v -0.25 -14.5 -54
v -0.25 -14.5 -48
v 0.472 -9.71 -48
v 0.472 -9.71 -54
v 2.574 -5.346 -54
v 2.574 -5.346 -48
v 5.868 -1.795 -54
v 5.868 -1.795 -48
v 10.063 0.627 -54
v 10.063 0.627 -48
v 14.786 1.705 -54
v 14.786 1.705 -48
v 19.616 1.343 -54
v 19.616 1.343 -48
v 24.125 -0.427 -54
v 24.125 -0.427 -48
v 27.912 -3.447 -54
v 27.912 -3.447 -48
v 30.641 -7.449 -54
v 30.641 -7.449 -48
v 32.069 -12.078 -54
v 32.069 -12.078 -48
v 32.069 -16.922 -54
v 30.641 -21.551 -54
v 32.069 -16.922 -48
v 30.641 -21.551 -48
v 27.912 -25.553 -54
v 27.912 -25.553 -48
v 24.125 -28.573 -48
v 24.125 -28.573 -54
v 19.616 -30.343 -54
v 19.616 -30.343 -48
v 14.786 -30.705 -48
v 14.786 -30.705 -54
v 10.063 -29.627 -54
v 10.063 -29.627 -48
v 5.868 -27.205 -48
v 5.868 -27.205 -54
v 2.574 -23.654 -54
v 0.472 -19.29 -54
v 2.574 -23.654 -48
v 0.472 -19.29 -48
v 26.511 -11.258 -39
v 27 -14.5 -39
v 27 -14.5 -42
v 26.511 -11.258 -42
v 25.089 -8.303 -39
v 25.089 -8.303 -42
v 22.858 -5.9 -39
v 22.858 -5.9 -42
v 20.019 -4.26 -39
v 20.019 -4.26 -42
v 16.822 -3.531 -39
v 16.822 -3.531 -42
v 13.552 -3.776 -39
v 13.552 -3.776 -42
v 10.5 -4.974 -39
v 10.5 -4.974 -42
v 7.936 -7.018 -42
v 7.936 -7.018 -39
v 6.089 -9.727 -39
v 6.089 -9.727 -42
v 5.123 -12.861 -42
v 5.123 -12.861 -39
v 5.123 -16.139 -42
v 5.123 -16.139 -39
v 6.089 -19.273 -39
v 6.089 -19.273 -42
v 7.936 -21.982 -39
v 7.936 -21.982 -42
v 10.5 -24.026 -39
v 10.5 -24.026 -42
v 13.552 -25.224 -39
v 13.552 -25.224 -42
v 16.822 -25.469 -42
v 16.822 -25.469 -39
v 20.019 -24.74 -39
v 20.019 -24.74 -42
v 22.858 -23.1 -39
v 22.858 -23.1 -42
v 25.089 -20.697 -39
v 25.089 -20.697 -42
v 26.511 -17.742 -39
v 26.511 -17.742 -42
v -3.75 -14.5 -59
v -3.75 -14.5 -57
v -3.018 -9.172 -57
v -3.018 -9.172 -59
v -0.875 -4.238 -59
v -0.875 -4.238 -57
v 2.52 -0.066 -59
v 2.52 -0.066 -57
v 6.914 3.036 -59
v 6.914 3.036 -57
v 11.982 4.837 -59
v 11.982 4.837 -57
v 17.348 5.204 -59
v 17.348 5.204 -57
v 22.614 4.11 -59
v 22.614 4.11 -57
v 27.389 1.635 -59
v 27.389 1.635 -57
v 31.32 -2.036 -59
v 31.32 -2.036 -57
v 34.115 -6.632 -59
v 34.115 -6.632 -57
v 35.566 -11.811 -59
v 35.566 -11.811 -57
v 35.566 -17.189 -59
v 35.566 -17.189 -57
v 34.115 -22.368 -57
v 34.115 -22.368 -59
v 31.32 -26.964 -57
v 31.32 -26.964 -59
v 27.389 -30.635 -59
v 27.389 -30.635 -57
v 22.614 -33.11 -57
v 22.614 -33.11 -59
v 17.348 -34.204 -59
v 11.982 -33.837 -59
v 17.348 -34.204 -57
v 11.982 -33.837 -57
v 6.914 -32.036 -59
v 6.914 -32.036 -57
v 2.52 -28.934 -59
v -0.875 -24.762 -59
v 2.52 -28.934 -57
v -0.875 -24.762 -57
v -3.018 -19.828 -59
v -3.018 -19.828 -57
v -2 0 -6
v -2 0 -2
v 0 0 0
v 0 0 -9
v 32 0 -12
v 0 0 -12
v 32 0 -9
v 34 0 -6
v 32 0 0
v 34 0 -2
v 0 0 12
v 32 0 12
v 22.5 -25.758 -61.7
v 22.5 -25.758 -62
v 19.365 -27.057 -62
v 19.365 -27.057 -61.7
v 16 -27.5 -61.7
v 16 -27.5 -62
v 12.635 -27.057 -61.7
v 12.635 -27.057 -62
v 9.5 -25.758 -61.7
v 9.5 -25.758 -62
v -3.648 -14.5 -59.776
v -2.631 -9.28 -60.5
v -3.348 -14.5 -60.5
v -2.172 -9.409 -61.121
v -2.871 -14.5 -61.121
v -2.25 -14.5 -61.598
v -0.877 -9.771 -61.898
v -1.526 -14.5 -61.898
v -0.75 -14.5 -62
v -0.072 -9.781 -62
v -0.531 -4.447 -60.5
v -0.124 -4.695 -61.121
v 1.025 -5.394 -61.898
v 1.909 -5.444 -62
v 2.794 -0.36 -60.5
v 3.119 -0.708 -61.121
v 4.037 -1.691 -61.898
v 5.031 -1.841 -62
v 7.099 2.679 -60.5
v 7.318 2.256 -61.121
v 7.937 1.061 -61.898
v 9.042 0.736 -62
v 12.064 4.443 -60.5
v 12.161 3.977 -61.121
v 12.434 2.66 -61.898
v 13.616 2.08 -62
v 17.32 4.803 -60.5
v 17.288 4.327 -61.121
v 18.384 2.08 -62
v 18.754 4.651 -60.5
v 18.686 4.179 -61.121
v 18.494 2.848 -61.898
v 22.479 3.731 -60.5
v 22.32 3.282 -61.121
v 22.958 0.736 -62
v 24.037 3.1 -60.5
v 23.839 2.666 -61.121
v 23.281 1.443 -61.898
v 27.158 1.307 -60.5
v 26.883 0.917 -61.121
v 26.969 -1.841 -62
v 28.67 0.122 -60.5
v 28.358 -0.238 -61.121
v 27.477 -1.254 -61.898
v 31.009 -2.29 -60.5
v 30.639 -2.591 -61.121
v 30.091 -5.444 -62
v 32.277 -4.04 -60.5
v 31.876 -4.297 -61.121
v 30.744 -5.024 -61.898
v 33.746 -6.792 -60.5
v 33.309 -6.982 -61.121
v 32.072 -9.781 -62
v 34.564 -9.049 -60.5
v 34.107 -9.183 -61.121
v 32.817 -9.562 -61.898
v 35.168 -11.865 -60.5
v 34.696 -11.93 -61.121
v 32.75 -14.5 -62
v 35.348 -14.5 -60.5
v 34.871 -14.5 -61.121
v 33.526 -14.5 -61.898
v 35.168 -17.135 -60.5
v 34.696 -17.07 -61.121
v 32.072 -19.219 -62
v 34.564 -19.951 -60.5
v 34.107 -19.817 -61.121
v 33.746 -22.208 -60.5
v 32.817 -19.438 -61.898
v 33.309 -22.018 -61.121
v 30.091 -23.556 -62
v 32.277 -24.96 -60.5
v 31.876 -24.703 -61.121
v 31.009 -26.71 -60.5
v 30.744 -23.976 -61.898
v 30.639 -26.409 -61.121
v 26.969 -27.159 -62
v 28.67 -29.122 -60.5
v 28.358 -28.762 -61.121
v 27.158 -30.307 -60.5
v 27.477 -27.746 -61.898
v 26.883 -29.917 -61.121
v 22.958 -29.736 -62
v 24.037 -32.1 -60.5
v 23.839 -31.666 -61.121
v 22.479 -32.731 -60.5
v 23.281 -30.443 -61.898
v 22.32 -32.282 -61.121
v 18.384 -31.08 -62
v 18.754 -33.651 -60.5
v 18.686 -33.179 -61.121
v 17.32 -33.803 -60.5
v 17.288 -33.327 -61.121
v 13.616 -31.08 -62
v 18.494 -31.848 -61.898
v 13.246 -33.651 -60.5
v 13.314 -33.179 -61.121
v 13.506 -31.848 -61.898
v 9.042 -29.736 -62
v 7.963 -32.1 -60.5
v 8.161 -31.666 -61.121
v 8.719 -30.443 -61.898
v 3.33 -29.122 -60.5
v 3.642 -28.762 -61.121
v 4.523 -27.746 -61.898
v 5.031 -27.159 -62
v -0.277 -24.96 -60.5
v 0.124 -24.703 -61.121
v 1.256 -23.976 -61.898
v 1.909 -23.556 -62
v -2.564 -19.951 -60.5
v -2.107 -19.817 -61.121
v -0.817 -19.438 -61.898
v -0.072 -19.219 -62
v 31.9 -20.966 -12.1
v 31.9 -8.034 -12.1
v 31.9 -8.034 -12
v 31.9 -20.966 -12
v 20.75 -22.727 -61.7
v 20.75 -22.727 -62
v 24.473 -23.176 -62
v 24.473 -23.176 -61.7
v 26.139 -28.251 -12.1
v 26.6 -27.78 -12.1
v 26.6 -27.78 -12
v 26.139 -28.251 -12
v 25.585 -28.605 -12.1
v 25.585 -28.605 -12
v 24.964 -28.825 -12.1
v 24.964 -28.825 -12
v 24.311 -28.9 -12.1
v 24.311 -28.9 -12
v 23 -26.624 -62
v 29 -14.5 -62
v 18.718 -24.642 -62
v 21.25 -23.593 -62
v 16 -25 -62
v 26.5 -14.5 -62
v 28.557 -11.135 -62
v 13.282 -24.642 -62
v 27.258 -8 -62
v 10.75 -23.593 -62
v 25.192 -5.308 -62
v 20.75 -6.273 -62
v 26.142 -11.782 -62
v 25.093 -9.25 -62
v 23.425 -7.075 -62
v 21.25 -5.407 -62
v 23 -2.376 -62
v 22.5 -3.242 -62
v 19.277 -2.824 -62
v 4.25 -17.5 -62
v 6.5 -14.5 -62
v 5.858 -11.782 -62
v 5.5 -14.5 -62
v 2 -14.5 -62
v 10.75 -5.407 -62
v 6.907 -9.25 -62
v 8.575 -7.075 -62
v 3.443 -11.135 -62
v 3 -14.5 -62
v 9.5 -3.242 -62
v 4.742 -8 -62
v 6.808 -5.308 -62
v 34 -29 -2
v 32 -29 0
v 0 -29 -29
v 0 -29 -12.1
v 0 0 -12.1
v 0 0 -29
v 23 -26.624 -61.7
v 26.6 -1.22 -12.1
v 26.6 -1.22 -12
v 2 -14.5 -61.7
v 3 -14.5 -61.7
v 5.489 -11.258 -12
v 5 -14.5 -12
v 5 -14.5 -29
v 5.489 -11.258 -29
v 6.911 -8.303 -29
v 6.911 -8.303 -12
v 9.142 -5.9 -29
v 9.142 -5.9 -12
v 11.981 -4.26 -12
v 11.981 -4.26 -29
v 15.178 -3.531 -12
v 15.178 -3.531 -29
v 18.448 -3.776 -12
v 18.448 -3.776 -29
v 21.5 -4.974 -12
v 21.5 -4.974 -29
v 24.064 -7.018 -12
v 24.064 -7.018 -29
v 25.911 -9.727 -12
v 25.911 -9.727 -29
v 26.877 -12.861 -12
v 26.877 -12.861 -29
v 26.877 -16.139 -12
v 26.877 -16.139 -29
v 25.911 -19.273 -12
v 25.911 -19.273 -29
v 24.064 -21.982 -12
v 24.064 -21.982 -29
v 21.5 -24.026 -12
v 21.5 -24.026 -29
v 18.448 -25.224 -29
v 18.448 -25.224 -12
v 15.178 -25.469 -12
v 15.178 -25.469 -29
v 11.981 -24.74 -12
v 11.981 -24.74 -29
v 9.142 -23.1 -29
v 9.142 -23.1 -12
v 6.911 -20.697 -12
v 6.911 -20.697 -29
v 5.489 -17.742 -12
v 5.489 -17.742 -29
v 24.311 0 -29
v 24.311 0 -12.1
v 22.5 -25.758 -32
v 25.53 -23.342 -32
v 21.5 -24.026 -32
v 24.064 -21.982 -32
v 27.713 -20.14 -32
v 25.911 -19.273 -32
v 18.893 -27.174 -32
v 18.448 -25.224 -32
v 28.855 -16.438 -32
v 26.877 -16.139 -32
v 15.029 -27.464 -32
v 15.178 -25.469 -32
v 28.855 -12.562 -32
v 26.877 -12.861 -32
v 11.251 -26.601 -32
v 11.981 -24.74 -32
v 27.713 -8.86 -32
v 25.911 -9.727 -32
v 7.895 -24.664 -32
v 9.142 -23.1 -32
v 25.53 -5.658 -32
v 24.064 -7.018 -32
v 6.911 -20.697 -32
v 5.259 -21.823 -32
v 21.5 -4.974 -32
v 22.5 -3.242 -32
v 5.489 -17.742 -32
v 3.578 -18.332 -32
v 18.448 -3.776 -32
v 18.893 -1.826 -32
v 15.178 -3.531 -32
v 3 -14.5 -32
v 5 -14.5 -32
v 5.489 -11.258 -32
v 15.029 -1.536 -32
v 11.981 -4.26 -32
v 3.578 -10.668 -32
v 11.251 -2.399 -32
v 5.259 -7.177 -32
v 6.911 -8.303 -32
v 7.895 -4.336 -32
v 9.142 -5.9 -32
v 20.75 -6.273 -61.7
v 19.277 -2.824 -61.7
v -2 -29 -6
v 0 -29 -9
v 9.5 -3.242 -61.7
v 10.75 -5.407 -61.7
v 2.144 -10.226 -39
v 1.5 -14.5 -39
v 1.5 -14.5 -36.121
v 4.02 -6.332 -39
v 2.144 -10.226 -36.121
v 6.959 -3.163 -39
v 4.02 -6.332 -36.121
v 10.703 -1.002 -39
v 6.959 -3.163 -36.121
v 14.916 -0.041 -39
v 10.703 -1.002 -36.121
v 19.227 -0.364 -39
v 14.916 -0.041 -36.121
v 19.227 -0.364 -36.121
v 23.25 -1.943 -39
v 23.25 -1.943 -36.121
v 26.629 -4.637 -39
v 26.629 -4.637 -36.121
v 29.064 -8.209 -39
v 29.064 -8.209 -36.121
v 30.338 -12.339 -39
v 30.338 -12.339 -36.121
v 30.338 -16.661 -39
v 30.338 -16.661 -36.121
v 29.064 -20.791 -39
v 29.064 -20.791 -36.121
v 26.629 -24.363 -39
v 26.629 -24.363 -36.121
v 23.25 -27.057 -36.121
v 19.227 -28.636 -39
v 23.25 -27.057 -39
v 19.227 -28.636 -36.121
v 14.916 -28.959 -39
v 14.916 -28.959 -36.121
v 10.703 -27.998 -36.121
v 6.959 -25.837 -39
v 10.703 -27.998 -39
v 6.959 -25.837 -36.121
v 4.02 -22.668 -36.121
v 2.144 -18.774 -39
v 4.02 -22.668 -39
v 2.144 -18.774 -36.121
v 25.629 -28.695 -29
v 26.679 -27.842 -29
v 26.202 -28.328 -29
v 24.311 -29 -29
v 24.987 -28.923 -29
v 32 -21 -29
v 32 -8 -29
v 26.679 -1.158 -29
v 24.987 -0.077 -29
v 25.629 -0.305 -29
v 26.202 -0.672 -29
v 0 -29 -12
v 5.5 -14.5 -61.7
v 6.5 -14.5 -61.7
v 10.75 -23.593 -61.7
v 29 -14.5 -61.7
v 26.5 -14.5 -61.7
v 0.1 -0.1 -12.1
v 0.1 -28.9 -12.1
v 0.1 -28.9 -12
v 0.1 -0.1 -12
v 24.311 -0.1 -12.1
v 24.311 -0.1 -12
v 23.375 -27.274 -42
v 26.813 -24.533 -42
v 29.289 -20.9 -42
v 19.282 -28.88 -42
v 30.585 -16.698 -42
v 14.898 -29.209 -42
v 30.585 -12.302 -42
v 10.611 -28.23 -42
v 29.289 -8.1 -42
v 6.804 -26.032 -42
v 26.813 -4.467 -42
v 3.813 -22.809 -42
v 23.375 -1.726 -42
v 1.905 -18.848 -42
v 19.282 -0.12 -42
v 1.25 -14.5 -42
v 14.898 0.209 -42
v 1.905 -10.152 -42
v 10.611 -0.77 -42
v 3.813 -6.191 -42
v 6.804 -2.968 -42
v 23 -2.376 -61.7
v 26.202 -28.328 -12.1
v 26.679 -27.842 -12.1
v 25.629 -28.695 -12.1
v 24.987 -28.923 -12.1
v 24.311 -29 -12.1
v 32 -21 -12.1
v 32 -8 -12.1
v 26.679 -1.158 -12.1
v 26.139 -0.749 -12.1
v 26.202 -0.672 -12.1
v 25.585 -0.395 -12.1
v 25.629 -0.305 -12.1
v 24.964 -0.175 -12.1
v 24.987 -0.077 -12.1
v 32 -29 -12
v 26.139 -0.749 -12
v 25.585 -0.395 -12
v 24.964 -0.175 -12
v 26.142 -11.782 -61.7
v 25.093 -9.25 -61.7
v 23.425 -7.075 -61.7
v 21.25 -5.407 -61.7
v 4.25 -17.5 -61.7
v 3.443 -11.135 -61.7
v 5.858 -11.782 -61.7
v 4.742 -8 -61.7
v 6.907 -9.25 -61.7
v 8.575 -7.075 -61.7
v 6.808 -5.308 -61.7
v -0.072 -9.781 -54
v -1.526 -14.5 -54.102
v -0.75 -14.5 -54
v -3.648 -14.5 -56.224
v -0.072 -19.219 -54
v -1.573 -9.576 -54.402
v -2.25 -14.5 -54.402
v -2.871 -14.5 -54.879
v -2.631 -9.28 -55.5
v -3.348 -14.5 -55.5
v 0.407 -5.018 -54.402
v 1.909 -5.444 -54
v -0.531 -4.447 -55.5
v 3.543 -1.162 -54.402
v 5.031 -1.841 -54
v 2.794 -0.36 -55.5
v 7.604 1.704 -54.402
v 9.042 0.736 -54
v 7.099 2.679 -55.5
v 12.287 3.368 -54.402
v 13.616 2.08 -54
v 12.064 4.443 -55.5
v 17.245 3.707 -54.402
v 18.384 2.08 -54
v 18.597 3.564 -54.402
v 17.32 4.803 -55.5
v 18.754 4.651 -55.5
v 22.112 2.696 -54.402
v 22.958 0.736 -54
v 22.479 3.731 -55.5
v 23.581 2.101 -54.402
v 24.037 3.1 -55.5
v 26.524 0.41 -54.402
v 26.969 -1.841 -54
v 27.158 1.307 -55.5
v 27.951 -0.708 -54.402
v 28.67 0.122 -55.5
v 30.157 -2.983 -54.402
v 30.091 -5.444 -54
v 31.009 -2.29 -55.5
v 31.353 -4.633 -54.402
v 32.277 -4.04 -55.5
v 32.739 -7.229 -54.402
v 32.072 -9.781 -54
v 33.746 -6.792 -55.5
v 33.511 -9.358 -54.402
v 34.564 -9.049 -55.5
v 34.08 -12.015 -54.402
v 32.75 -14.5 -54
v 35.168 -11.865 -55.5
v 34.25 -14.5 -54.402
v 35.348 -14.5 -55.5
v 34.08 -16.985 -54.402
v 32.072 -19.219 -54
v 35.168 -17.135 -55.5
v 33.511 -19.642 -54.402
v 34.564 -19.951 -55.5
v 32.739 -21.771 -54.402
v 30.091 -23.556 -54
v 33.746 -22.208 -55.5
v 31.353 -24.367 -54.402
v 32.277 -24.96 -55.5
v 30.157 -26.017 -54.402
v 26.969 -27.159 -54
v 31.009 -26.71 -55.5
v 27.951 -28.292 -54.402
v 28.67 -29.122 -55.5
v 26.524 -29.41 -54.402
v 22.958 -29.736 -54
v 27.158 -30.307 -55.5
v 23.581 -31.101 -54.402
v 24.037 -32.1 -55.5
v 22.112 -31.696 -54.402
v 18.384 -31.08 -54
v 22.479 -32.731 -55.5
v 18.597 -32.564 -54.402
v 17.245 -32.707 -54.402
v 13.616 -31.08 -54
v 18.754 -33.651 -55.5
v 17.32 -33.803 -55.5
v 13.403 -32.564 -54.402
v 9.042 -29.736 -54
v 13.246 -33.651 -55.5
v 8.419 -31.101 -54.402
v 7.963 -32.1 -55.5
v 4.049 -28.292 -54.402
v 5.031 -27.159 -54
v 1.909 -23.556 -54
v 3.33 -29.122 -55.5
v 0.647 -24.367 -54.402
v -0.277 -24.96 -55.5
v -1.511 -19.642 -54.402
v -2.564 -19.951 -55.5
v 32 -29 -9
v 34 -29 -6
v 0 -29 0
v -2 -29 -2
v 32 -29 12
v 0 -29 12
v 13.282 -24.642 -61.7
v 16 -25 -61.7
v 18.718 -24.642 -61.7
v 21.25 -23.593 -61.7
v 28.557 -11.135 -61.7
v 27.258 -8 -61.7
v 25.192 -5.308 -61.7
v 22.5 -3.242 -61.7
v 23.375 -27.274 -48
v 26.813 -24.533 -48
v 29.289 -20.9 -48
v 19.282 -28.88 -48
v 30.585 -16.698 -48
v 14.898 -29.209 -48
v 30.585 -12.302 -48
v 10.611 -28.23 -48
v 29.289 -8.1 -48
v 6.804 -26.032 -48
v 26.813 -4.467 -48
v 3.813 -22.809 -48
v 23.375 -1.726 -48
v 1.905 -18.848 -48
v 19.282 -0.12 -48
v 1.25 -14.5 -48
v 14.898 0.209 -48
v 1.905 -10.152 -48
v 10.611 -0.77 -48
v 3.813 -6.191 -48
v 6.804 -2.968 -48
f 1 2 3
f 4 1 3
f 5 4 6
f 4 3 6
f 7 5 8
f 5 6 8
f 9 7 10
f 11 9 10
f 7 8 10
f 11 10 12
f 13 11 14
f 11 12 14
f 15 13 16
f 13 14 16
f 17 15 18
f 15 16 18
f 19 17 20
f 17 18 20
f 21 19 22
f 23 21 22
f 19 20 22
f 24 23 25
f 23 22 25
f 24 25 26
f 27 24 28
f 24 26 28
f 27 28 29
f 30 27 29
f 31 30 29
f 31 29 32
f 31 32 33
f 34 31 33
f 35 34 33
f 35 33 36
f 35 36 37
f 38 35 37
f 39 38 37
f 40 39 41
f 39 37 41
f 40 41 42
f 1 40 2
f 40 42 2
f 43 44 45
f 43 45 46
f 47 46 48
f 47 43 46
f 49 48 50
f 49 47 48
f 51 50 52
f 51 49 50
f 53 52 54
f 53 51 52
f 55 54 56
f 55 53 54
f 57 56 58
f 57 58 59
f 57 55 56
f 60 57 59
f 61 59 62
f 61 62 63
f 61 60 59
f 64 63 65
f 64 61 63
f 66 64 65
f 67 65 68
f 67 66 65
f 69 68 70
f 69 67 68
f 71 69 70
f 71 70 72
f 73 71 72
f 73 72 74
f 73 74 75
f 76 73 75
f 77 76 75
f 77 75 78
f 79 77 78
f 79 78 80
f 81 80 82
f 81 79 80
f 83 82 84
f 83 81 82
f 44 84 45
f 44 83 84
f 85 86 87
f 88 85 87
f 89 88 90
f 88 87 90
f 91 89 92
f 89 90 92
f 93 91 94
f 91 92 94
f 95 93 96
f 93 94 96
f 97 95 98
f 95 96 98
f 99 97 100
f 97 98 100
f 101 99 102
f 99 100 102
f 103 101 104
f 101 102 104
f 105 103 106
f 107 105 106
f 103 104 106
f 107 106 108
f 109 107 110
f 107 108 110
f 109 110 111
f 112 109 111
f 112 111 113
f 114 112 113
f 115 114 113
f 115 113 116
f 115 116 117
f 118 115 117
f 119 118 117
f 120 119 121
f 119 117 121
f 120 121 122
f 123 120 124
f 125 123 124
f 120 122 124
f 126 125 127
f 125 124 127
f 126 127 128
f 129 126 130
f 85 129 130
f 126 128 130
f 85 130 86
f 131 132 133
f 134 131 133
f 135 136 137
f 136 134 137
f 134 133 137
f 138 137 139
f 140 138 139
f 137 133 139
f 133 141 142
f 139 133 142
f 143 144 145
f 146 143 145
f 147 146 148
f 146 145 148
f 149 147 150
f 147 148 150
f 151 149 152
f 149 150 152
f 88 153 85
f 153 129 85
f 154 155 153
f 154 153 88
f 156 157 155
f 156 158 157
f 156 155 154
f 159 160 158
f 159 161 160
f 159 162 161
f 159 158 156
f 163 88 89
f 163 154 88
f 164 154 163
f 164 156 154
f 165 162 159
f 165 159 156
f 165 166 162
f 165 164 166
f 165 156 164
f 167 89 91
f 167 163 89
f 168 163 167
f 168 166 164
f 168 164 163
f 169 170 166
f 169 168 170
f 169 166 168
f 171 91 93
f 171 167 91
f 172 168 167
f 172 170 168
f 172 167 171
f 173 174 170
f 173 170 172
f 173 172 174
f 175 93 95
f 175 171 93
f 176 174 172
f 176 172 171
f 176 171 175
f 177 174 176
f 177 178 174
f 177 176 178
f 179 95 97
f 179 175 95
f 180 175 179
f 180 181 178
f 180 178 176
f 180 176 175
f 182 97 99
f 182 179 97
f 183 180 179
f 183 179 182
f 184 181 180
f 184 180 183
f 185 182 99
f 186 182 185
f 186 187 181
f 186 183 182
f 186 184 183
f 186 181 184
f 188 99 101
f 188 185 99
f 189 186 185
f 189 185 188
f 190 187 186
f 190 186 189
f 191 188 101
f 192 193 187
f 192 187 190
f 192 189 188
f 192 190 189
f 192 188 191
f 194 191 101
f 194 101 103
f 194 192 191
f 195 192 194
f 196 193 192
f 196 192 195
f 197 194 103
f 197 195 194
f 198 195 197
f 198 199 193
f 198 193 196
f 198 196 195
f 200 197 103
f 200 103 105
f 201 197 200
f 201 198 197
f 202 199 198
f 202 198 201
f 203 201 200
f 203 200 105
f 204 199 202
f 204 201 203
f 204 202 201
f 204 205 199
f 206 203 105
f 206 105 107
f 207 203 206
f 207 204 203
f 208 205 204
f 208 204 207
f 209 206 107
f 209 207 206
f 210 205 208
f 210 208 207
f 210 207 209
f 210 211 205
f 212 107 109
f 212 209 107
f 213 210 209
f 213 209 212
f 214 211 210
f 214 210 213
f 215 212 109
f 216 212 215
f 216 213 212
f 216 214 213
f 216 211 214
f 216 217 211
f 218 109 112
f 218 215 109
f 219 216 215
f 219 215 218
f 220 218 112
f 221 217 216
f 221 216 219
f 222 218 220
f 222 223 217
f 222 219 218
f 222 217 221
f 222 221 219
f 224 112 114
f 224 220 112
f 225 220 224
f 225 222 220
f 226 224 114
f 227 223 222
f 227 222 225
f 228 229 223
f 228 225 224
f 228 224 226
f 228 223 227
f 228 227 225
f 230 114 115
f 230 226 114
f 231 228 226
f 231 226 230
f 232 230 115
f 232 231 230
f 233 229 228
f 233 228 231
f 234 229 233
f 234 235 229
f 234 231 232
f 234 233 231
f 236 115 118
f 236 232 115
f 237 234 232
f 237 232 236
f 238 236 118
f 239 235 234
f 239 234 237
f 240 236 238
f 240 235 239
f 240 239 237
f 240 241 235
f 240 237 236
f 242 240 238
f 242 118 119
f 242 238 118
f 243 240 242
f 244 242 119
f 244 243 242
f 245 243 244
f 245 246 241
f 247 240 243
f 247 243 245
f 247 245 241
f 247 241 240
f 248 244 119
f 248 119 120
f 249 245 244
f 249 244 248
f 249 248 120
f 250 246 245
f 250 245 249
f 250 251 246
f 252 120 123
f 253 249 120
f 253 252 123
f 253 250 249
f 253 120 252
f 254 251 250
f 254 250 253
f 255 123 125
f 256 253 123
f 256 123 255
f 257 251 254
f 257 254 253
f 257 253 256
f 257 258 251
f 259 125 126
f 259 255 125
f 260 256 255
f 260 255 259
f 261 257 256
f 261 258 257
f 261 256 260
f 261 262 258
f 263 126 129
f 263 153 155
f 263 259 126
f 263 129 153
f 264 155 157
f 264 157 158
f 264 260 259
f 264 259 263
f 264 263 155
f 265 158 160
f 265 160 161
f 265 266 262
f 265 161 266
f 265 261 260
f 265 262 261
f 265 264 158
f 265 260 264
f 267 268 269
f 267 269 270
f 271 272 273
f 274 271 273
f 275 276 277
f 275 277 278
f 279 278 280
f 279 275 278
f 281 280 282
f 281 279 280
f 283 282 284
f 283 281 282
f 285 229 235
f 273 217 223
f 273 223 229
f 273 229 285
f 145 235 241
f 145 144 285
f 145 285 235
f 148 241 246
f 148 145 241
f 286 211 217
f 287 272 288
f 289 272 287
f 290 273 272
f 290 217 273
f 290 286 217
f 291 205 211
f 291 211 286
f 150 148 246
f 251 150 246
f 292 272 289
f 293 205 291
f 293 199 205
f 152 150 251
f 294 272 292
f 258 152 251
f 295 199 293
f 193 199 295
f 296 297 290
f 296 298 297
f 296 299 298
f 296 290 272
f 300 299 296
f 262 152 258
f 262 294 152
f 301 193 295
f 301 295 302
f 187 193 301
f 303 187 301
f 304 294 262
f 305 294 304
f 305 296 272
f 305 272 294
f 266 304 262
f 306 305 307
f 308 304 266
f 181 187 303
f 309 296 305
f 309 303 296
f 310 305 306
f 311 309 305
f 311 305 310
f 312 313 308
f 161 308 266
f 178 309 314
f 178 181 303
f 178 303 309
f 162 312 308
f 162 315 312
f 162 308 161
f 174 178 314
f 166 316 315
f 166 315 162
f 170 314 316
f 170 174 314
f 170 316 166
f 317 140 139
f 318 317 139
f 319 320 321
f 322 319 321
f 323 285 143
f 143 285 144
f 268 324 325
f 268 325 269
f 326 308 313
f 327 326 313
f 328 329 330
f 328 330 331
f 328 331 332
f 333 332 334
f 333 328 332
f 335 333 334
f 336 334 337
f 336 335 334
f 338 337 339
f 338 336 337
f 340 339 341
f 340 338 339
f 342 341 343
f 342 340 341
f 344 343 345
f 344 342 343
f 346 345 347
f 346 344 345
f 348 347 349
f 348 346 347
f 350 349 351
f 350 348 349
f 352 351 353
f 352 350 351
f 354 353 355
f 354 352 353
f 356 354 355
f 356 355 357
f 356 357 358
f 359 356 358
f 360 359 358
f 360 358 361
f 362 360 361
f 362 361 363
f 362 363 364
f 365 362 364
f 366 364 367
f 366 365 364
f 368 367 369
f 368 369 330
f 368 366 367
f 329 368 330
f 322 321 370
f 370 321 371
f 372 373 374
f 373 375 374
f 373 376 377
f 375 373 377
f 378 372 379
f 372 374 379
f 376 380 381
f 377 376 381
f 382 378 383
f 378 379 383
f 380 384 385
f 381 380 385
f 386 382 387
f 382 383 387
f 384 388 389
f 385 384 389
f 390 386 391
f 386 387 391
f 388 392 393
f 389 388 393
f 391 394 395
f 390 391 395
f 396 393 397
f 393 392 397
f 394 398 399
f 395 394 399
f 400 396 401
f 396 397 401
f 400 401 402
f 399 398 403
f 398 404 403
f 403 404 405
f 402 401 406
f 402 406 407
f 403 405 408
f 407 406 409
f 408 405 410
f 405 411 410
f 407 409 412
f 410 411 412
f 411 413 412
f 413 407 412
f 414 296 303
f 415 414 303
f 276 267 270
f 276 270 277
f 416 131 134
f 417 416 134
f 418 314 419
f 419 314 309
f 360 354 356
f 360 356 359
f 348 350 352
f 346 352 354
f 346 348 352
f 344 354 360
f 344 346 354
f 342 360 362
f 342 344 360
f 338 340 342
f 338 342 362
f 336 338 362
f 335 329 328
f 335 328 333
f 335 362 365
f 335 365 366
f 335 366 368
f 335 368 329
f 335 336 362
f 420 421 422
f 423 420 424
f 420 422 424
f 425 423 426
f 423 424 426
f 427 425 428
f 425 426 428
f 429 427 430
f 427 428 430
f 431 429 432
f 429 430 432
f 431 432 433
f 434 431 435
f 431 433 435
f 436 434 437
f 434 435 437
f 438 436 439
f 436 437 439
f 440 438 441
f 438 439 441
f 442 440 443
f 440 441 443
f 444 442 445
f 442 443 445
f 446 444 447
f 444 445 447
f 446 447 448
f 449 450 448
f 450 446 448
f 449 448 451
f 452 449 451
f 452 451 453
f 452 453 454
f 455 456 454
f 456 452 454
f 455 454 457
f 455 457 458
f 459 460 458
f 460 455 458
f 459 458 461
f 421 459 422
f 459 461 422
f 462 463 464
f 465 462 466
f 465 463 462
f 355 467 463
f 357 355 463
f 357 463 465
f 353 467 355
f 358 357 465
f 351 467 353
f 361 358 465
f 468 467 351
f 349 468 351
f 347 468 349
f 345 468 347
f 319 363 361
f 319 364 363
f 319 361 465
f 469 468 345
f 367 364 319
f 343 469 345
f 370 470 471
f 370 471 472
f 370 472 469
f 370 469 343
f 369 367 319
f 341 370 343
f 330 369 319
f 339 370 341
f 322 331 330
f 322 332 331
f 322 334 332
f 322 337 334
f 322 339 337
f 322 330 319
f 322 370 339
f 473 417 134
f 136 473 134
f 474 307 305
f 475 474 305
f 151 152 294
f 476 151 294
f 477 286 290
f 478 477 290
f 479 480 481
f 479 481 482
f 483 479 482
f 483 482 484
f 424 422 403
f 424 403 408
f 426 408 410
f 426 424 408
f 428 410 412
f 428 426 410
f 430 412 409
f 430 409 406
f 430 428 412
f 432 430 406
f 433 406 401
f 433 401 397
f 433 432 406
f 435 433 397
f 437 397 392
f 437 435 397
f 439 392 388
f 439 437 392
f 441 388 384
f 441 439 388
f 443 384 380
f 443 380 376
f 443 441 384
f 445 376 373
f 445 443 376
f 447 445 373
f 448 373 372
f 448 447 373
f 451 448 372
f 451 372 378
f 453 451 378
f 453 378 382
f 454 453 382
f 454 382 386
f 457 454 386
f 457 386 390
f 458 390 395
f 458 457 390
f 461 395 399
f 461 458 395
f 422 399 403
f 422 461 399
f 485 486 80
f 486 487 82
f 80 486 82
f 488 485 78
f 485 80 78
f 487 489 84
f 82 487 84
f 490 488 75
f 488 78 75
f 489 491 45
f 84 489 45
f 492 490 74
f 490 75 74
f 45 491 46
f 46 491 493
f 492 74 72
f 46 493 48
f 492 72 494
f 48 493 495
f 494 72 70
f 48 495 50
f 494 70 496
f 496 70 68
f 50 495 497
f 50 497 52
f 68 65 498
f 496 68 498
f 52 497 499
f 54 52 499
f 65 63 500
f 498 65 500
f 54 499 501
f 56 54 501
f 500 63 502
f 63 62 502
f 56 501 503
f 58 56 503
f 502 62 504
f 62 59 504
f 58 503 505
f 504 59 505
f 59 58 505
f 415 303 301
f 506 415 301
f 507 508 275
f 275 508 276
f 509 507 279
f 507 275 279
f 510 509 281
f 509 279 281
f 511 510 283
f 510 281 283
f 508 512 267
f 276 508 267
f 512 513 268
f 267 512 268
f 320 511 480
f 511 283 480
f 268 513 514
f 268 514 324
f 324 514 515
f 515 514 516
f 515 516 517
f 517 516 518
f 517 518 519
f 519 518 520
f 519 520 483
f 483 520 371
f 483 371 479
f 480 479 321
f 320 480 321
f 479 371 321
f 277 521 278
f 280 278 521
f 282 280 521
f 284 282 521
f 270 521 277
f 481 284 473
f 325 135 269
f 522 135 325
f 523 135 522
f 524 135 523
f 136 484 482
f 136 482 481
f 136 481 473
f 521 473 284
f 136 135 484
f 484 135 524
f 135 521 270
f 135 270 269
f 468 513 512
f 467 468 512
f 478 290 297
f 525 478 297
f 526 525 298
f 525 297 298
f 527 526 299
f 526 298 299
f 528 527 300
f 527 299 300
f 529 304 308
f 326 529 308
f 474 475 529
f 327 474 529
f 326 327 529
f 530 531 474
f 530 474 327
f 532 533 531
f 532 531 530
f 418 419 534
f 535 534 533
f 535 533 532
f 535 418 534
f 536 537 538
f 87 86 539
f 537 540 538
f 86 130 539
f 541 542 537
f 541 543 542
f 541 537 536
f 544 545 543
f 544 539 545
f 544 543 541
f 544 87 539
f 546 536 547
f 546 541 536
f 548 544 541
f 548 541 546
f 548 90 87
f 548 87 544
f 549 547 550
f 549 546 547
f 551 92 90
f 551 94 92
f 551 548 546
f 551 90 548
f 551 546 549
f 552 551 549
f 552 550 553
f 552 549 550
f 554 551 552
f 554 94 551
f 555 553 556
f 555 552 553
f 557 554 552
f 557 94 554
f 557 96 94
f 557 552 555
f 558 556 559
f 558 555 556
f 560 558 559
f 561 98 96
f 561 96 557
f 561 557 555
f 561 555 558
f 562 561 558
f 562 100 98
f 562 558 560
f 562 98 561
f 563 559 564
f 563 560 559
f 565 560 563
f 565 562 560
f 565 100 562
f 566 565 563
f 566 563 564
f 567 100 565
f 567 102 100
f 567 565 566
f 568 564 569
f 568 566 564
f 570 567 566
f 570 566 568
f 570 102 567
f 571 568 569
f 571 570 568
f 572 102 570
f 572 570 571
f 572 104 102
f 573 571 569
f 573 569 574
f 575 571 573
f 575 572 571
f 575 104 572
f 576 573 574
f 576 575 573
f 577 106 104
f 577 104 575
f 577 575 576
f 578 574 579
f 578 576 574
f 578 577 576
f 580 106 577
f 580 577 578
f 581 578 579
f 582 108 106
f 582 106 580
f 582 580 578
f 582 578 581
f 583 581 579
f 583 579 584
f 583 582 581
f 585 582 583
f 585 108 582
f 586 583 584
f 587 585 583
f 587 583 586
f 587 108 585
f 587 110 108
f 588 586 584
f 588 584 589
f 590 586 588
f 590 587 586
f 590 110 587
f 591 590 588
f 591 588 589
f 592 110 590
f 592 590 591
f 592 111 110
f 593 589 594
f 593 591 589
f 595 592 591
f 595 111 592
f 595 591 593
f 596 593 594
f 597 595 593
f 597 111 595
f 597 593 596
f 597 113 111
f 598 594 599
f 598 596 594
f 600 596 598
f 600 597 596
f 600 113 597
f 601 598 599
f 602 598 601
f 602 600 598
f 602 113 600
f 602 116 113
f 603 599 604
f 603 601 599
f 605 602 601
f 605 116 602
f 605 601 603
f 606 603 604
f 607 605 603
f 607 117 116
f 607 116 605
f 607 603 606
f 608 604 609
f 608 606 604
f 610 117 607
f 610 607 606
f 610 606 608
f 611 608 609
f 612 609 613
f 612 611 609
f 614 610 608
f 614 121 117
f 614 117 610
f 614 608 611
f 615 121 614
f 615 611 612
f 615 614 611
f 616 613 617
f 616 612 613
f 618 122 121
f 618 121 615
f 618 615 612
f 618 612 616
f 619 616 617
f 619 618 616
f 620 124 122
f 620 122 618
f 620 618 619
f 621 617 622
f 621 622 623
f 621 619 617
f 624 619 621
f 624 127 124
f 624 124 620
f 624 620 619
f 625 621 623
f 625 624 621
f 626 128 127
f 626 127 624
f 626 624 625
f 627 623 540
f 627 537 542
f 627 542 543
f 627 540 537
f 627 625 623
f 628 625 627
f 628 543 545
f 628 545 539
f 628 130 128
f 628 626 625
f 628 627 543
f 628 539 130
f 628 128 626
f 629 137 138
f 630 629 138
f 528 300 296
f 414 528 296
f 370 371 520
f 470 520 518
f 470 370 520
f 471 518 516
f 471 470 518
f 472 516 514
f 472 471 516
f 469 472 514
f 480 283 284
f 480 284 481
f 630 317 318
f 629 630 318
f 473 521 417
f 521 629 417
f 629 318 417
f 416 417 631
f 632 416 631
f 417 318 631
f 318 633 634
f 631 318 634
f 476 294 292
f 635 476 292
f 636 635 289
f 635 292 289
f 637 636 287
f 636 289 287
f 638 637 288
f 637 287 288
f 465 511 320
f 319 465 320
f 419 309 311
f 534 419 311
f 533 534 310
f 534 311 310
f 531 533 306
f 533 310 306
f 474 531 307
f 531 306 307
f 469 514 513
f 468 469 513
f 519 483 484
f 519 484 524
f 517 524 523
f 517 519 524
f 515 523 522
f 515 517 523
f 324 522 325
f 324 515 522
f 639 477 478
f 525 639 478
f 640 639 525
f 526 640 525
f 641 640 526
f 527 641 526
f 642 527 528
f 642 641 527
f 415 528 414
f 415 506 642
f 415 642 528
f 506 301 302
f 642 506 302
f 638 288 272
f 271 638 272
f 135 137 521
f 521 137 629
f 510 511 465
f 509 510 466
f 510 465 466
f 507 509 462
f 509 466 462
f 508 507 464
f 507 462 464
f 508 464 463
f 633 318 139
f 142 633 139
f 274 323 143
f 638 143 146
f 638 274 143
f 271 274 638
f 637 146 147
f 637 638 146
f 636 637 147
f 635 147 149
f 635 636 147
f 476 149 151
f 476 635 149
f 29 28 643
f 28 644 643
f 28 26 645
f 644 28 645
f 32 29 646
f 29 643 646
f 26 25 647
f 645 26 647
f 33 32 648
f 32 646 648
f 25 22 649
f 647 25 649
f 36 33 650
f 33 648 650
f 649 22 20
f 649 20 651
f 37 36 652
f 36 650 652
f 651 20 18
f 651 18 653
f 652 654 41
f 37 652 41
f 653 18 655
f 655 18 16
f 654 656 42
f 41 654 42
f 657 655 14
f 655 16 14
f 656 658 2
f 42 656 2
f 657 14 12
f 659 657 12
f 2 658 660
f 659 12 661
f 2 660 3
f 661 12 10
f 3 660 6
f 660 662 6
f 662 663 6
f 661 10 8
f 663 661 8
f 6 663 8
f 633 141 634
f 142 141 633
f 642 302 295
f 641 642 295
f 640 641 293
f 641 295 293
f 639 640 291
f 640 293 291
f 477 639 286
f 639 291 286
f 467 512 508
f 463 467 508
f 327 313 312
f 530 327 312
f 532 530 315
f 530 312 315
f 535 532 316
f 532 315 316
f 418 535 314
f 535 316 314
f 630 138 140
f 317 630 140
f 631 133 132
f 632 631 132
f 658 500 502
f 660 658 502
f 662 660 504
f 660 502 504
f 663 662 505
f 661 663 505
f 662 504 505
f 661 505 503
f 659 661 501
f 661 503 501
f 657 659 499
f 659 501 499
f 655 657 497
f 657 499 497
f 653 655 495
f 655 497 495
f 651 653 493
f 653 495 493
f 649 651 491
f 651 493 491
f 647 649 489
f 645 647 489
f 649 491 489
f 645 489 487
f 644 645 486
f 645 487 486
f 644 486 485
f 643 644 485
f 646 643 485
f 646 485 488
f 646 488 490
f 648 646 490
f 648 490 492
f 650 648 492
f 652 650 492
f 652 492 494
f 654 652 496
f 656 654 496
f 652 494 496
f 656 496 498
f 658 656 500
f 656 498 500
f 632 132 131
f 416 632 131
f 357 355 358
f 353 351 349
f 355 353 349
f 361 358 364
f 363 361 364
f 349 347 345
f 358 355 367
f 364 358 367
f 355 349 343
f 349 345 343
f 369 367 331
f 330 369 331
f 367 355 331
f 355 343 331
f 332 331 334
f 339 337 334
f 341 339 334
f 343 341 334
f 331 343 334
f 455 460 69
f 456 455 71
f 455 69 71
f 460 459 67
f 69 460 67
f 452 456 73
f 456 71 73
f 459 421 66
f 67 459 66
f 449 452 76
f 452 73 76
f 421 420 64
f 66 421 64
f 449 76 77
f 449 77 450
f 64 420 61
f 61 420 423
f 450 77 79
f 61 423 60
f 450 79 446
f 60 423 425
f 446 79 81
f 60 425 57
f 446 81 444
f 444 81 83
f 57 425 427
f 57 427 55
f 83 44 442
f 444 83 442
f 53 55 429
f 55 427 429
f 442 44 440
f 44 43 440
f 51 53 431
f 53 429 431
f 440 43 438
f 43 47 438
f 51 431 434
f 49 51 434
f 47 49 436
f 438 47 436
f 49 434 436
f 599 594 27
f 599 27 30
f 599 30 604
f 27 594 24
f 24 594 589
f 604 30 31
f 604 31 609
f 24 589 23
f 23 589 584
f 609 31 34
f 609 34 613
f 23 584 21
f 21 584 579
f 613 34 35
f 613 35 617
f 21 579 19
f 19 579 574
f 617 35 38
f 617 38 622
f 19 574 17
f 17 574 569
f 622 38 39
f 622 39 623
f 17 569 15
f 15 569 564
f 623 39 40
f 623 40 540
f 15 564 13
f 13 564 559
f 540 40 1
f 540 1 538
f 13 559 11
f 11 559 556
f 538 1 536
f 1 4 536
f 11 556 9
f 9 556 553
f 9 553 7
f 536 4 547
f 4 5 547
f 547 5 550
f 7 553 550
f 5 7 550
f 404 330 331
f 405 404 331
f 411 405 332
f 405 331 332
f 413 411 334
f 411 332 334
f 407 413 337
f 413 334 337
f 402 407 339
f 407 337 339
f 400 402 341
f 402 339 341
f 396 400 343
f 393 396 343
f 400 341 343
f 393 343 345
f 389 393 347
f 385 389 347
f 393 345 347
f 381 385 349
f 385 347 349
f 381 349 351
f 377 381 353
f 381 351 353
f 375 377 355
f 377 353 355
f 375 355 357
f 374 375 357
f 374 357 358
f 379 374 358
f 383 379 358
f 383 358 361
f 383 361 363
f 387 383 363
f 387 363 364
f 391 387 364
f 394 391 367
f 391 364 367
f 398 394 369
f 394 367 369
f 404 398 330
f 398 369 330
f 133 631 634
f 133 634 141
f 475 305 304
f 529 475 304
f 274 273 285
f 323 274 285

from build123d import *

# Parameters (mm, degrees)
SKETCH_1_W          = 32
SKETCH_1_H          = 29
EXTRUDE_1_DEPTH     = 12
EXTRUDE_2_DEPTH     = 29
SKETCH_3_R          = 11
EXTRUDE_3_DEPTH     = 17
SKETCH_4_R          = 11
EXTRUDE_4_DEPTH     = 3
SKETCH_5_R          = 14.5
EXTRUDE_6_DEPTH     = 10
SKETCH_6_R          = 14.75
EXTRUDE_7_DEPTH     = 6
SKETCH_7_R          = 16.25
EXTRUDE_8_DEPTH     = 6
SKETCH_8_R          = 19.75
EXTRUDE_9_DEPTH     = 8
CUT_EXTRUDE_START   = 3
SKETCH_9_R          = 22.553802592
SKETCH_9_R_2        = 11
CUT_EXTRUDE_1_DEPTH = 3
CHAMFER_1_SIZE      = 1.5
CHAMFER_1_SIZE2     = 4.121216129
FILLET_1_R          = 3
FILLET_2_R          = 3
CUT_EXTRUDE_START_2 = 0.1
CUT_EXTRUDE_2_DEPTH = 0.1
CUT_EXTRUDE_3_DEPTH = 0.3


with BuildPart() as part:
    # 草图1 → 凸台-拉伸1 (new body)
    with BuildSketch(Plane.XY):
        with Locations((16, -14.5)):
            Rectangle(SKETCH_1_W, SKETCH_1_H)
    extrude(amount=EXTRUDE_1_DEPTH)

    # 草图2 → 凸台-拉伸2 (add)
    with BuildSketch(Plane(origin=(0, 0, 0), x_dir=(1, 0, 0), z_dir=(0, 1, 0))):
        Polygon((0, 0), (-2, 2), (-2, 6), (0, 9), (0, 12), (29.3, 12), (32, 12), (32, 9), (34, 6), (34, 2), (32, 0), align=None)
    extrude(amount=-EXTRUDE_2_DEPTH)

    # 草图3 → 凸台-拉伸3 (add)
    with BuildSketch(Plane(origin=(0, 0, -12), x_dir=(-1, 0, 0), z_dir=(0, 0, -1))):
        Polygon((0, 0), (-25.777777778, 0), (-32, -8), (-32, -21), (-25.777777778, -29), (0, -29), align=None)
        with Locations((-16, -14.5)):
            Circle(SKETCH_3_R, mode=Mode.SUBTRACT)
    extrude(amount=EXTRUDE_3_DEPTH)

    # 圆角2
    fillet_2_edges = [part.edges().sort_by_distance(p)[0] for p in [
        (25.777777778, 0, -20.5),
        (25.777777778, -29, -20.5),
    ]]
    fillet(fillet_2_edges, radius=FILLET_2_R)

    # 草图10 → 切除-拉伸2 (cut)
    with BuildSketch(Plane(origin=(0, 0, -12), x_dir=(-1, 0, 0), z_dir=(0, 0, -1)).offset(CUT_EXTRUDE_START_2)):
        with BuildLine():
            Line((-32, -8), (-32, -21))
            Line((-32, -21), (-26.678583013, -27.841821841))
            ThreePointArc((-26.678583013, -27.841821841), (-25.628580699, -28.694945781), (-24.310526361, -29))
            Line((-24.310526361, -29), (0, -29))
            Line((0, -29), (0, 0))
            Line((0, 0), (-24.310526361, 0))
            ThreePointArc((-24.310526361, 0), (-25.628580699, -0.305054219), (-26.678583013, -1.158178159))
            Line((-26.678583013, -1.158178159), (-32, -8))
        make_face()
        with BuildLine():
            Line((-31.9, -8.034310775), (-31.9, -20.965689225))
            Line((-31.9, -20.965689225), (-26.599647791, -27.780427779))
            ThreePointArc((-26.599647791, -27.780427779), (-25.584645555, -28.605114255), (-24.310526361, -28.9))
            Line((-24.310526361, -28.9), (-0.1, -28.9))
            Line((-0.1, -28.9), (-0.1, -0.1))
            Line((-0.1, -0.1), (-24.310526361, -0.1))
            ThreePointArc((-24.310526361, -0.1), (-25.584645555, -0.394885745), (-26.599647791, -1.219572221))
            Line((-26.599647791, -1.219572221), (-31.9, -8.034310775))
        make_face(mode=Mode.SUBTRACT)
    extrude(amount=-CUT_EXTRUDE_2_DEPTH, mode=Mode.SUBTRACT)


with BuildPart() as body_2:
    # 草图4 → 凸台-拉伸4 (new body)
    with BuildSketch(Plane(origin=(0, 0, -29), x_dir=(-1, 0, 0), z_dir=(0, 0, -1))):
        with Locations((-16, -14.5)):
            Circle(SKETCH_4_R)
    extrude(amount=EXTRUDE_4_DEPTH)

    # 草图5 → 凸台-拉伸6 (add)
    with BuildSketch(Plane(origin=(0, 0, -32), x_dir=(-1, 0, 0), z_dir=(0, 0, -1))):
        with Locations((-16, -14.5)):
            Circle(SKETCH_5_R)
    extrude(amount=EXTRUDE_6_DEPTH)

    # 草图6 → 凸台-拉伸7 (add)
    with BuildSketch(Plane(origin=(0, 0, -42), x_dir=(-1, 0, 0), z_dir=(0, 0, -1))):
        with Locations((-16, -14.5)):
            Circle(SKETCH_6_R)
    extrude(amount=EXTRUDE_7_DEPTH)

    # 草图7 → 凸台-拉伸8 (add)
    with BuildSketch(Plane(origin=(0, 0, -48), x_dir=(-1, 0, 0), z_dir=(0, 0, -1))):
        with Locations((-16, -14.5)):
            Circle(SKETCH_7_R)
    extrude(amount=EXTRUDE_8_DEPTH)

    # 草图8 → 凸台-拉伸9 (add)
    with BuildSketch(Plane(origin=(0, 0, -54), x_dir=(-1, 0, 0), z_dir=(0, 0, -1))):
        with Locations((-16, -14.5)):
            Circle(SKETCH_8_R)
    extrude(amount=EXTRUDE_9_DEPTH)

    # 草图9 → 切除-拉伸1 (cut)
    with BuildSketch(Plane.XY.offset(-42).offset(CUT_EXTRUDE_START)):
        with Locations((16, -14.5)):
            Circle(SKETCH_9_R)
        with Locations((16, -14.5)):
            Circle(SKETCH_9_R_2, mode=Mode.SUBTRACT)
    extrude(amount=-CUT_EXTRUDE_1_DEPTH, mode=Mode.SUBTRACT)

    # 倒角1
    chamfer_1_edges = [body_2.edges().sort_by_distance(p)[0] for p in [
        (30.5, -14.5, -32),
    ]]
    chamfer_1_side = [body_2.faces().sort_by_distance(p)[0] for p in [
        (30.089878067, -14.5, -32),
    ]]
    chamfer(chamfer_1_edges, length=CHAMFER_1_SIZE, length2=CHAMFER_1_SIZE2, reference=chamfer_1_side[0])

    # 圆角1
    fillet_1_edges = [body_2.edges().sort_by_distance(p)[0] for p in [
        (35.75, -14.5, -54),
        (35.75, -14.5, -62),
    ]]
    fillet(fillet_1_edges, radius=FILLET_1_R)

    # 草图11 → 切除-拉伸3 (cut)
    with BuildSketch(Plane(origin=(0, 0, -62), x_dir=(-1, 0, 0), z_dir=(0, 0, -1))):
        Polygon((-5.5, -14.5), (-6.5, -14.5), (-4.25, -17.5), (-2, -14.5), (-3, -14.5), align=None)
        with BuildLine():
            Line((-5.5, -14.5), (-3, -14.5))
            ThreePointArc((-3, -14.5), (-4.741669751, -8), (-9.5, -3.241669751))
            Line((-9.5, -3.241669751), (-10.75, -5.40673326))
            ThreePointArc((-10.75, -5.40673326), (-6.90673326, -9.25), (-5.5, -14.5))
        make_face()
        with BuildLine():
            Line((-21.25, -23.59326674), (-22.5, -25.758330249))
            ThreePointArc((-22.5, -25.758330249), (-16, -27.5), (-9.5, -25.758330249))
            Line((-9.5, -25.758330249), (-10.75, -23.59326674))
            ThreePointArc((-10.75, -23.59326674), (-16, -25), (-21.25, -23.59326674))
        make_face()
        Polygon((-21.25, -23.59326674), (-20.75, -22.727241336), (-24.473076211, -23.175798494), (-23, -26.624355653), (-22.5, -25.758330249), align=None)
        Polygon((-21.25, -5.40673326), (-20.75, -6.272758664), (-19.276923789, -2.824201506), (-23, -2.375644347), (-22.5, -3.241669751), align=None)
        with BuildLine():
            Line((-21.25, -5.40673326), (-22.5, -3.241669751))
            ThreePointArc((-22.5, -3.241669751), (-27.258330249, -8), (-29, -14.5))
            Line((-29, -14.5), (-26.5, -14.5))
            ThreePointArc((-26.5, -14.5), (-25.09326674, -9.25), (-21.25, -5.40673326))
        make_face()
    extrude(amount=-CUT_EXTRUDE_3_DEPTH, mode=Mode.SUBTRACT)


solid = Compound([part.part, body_2.part])
